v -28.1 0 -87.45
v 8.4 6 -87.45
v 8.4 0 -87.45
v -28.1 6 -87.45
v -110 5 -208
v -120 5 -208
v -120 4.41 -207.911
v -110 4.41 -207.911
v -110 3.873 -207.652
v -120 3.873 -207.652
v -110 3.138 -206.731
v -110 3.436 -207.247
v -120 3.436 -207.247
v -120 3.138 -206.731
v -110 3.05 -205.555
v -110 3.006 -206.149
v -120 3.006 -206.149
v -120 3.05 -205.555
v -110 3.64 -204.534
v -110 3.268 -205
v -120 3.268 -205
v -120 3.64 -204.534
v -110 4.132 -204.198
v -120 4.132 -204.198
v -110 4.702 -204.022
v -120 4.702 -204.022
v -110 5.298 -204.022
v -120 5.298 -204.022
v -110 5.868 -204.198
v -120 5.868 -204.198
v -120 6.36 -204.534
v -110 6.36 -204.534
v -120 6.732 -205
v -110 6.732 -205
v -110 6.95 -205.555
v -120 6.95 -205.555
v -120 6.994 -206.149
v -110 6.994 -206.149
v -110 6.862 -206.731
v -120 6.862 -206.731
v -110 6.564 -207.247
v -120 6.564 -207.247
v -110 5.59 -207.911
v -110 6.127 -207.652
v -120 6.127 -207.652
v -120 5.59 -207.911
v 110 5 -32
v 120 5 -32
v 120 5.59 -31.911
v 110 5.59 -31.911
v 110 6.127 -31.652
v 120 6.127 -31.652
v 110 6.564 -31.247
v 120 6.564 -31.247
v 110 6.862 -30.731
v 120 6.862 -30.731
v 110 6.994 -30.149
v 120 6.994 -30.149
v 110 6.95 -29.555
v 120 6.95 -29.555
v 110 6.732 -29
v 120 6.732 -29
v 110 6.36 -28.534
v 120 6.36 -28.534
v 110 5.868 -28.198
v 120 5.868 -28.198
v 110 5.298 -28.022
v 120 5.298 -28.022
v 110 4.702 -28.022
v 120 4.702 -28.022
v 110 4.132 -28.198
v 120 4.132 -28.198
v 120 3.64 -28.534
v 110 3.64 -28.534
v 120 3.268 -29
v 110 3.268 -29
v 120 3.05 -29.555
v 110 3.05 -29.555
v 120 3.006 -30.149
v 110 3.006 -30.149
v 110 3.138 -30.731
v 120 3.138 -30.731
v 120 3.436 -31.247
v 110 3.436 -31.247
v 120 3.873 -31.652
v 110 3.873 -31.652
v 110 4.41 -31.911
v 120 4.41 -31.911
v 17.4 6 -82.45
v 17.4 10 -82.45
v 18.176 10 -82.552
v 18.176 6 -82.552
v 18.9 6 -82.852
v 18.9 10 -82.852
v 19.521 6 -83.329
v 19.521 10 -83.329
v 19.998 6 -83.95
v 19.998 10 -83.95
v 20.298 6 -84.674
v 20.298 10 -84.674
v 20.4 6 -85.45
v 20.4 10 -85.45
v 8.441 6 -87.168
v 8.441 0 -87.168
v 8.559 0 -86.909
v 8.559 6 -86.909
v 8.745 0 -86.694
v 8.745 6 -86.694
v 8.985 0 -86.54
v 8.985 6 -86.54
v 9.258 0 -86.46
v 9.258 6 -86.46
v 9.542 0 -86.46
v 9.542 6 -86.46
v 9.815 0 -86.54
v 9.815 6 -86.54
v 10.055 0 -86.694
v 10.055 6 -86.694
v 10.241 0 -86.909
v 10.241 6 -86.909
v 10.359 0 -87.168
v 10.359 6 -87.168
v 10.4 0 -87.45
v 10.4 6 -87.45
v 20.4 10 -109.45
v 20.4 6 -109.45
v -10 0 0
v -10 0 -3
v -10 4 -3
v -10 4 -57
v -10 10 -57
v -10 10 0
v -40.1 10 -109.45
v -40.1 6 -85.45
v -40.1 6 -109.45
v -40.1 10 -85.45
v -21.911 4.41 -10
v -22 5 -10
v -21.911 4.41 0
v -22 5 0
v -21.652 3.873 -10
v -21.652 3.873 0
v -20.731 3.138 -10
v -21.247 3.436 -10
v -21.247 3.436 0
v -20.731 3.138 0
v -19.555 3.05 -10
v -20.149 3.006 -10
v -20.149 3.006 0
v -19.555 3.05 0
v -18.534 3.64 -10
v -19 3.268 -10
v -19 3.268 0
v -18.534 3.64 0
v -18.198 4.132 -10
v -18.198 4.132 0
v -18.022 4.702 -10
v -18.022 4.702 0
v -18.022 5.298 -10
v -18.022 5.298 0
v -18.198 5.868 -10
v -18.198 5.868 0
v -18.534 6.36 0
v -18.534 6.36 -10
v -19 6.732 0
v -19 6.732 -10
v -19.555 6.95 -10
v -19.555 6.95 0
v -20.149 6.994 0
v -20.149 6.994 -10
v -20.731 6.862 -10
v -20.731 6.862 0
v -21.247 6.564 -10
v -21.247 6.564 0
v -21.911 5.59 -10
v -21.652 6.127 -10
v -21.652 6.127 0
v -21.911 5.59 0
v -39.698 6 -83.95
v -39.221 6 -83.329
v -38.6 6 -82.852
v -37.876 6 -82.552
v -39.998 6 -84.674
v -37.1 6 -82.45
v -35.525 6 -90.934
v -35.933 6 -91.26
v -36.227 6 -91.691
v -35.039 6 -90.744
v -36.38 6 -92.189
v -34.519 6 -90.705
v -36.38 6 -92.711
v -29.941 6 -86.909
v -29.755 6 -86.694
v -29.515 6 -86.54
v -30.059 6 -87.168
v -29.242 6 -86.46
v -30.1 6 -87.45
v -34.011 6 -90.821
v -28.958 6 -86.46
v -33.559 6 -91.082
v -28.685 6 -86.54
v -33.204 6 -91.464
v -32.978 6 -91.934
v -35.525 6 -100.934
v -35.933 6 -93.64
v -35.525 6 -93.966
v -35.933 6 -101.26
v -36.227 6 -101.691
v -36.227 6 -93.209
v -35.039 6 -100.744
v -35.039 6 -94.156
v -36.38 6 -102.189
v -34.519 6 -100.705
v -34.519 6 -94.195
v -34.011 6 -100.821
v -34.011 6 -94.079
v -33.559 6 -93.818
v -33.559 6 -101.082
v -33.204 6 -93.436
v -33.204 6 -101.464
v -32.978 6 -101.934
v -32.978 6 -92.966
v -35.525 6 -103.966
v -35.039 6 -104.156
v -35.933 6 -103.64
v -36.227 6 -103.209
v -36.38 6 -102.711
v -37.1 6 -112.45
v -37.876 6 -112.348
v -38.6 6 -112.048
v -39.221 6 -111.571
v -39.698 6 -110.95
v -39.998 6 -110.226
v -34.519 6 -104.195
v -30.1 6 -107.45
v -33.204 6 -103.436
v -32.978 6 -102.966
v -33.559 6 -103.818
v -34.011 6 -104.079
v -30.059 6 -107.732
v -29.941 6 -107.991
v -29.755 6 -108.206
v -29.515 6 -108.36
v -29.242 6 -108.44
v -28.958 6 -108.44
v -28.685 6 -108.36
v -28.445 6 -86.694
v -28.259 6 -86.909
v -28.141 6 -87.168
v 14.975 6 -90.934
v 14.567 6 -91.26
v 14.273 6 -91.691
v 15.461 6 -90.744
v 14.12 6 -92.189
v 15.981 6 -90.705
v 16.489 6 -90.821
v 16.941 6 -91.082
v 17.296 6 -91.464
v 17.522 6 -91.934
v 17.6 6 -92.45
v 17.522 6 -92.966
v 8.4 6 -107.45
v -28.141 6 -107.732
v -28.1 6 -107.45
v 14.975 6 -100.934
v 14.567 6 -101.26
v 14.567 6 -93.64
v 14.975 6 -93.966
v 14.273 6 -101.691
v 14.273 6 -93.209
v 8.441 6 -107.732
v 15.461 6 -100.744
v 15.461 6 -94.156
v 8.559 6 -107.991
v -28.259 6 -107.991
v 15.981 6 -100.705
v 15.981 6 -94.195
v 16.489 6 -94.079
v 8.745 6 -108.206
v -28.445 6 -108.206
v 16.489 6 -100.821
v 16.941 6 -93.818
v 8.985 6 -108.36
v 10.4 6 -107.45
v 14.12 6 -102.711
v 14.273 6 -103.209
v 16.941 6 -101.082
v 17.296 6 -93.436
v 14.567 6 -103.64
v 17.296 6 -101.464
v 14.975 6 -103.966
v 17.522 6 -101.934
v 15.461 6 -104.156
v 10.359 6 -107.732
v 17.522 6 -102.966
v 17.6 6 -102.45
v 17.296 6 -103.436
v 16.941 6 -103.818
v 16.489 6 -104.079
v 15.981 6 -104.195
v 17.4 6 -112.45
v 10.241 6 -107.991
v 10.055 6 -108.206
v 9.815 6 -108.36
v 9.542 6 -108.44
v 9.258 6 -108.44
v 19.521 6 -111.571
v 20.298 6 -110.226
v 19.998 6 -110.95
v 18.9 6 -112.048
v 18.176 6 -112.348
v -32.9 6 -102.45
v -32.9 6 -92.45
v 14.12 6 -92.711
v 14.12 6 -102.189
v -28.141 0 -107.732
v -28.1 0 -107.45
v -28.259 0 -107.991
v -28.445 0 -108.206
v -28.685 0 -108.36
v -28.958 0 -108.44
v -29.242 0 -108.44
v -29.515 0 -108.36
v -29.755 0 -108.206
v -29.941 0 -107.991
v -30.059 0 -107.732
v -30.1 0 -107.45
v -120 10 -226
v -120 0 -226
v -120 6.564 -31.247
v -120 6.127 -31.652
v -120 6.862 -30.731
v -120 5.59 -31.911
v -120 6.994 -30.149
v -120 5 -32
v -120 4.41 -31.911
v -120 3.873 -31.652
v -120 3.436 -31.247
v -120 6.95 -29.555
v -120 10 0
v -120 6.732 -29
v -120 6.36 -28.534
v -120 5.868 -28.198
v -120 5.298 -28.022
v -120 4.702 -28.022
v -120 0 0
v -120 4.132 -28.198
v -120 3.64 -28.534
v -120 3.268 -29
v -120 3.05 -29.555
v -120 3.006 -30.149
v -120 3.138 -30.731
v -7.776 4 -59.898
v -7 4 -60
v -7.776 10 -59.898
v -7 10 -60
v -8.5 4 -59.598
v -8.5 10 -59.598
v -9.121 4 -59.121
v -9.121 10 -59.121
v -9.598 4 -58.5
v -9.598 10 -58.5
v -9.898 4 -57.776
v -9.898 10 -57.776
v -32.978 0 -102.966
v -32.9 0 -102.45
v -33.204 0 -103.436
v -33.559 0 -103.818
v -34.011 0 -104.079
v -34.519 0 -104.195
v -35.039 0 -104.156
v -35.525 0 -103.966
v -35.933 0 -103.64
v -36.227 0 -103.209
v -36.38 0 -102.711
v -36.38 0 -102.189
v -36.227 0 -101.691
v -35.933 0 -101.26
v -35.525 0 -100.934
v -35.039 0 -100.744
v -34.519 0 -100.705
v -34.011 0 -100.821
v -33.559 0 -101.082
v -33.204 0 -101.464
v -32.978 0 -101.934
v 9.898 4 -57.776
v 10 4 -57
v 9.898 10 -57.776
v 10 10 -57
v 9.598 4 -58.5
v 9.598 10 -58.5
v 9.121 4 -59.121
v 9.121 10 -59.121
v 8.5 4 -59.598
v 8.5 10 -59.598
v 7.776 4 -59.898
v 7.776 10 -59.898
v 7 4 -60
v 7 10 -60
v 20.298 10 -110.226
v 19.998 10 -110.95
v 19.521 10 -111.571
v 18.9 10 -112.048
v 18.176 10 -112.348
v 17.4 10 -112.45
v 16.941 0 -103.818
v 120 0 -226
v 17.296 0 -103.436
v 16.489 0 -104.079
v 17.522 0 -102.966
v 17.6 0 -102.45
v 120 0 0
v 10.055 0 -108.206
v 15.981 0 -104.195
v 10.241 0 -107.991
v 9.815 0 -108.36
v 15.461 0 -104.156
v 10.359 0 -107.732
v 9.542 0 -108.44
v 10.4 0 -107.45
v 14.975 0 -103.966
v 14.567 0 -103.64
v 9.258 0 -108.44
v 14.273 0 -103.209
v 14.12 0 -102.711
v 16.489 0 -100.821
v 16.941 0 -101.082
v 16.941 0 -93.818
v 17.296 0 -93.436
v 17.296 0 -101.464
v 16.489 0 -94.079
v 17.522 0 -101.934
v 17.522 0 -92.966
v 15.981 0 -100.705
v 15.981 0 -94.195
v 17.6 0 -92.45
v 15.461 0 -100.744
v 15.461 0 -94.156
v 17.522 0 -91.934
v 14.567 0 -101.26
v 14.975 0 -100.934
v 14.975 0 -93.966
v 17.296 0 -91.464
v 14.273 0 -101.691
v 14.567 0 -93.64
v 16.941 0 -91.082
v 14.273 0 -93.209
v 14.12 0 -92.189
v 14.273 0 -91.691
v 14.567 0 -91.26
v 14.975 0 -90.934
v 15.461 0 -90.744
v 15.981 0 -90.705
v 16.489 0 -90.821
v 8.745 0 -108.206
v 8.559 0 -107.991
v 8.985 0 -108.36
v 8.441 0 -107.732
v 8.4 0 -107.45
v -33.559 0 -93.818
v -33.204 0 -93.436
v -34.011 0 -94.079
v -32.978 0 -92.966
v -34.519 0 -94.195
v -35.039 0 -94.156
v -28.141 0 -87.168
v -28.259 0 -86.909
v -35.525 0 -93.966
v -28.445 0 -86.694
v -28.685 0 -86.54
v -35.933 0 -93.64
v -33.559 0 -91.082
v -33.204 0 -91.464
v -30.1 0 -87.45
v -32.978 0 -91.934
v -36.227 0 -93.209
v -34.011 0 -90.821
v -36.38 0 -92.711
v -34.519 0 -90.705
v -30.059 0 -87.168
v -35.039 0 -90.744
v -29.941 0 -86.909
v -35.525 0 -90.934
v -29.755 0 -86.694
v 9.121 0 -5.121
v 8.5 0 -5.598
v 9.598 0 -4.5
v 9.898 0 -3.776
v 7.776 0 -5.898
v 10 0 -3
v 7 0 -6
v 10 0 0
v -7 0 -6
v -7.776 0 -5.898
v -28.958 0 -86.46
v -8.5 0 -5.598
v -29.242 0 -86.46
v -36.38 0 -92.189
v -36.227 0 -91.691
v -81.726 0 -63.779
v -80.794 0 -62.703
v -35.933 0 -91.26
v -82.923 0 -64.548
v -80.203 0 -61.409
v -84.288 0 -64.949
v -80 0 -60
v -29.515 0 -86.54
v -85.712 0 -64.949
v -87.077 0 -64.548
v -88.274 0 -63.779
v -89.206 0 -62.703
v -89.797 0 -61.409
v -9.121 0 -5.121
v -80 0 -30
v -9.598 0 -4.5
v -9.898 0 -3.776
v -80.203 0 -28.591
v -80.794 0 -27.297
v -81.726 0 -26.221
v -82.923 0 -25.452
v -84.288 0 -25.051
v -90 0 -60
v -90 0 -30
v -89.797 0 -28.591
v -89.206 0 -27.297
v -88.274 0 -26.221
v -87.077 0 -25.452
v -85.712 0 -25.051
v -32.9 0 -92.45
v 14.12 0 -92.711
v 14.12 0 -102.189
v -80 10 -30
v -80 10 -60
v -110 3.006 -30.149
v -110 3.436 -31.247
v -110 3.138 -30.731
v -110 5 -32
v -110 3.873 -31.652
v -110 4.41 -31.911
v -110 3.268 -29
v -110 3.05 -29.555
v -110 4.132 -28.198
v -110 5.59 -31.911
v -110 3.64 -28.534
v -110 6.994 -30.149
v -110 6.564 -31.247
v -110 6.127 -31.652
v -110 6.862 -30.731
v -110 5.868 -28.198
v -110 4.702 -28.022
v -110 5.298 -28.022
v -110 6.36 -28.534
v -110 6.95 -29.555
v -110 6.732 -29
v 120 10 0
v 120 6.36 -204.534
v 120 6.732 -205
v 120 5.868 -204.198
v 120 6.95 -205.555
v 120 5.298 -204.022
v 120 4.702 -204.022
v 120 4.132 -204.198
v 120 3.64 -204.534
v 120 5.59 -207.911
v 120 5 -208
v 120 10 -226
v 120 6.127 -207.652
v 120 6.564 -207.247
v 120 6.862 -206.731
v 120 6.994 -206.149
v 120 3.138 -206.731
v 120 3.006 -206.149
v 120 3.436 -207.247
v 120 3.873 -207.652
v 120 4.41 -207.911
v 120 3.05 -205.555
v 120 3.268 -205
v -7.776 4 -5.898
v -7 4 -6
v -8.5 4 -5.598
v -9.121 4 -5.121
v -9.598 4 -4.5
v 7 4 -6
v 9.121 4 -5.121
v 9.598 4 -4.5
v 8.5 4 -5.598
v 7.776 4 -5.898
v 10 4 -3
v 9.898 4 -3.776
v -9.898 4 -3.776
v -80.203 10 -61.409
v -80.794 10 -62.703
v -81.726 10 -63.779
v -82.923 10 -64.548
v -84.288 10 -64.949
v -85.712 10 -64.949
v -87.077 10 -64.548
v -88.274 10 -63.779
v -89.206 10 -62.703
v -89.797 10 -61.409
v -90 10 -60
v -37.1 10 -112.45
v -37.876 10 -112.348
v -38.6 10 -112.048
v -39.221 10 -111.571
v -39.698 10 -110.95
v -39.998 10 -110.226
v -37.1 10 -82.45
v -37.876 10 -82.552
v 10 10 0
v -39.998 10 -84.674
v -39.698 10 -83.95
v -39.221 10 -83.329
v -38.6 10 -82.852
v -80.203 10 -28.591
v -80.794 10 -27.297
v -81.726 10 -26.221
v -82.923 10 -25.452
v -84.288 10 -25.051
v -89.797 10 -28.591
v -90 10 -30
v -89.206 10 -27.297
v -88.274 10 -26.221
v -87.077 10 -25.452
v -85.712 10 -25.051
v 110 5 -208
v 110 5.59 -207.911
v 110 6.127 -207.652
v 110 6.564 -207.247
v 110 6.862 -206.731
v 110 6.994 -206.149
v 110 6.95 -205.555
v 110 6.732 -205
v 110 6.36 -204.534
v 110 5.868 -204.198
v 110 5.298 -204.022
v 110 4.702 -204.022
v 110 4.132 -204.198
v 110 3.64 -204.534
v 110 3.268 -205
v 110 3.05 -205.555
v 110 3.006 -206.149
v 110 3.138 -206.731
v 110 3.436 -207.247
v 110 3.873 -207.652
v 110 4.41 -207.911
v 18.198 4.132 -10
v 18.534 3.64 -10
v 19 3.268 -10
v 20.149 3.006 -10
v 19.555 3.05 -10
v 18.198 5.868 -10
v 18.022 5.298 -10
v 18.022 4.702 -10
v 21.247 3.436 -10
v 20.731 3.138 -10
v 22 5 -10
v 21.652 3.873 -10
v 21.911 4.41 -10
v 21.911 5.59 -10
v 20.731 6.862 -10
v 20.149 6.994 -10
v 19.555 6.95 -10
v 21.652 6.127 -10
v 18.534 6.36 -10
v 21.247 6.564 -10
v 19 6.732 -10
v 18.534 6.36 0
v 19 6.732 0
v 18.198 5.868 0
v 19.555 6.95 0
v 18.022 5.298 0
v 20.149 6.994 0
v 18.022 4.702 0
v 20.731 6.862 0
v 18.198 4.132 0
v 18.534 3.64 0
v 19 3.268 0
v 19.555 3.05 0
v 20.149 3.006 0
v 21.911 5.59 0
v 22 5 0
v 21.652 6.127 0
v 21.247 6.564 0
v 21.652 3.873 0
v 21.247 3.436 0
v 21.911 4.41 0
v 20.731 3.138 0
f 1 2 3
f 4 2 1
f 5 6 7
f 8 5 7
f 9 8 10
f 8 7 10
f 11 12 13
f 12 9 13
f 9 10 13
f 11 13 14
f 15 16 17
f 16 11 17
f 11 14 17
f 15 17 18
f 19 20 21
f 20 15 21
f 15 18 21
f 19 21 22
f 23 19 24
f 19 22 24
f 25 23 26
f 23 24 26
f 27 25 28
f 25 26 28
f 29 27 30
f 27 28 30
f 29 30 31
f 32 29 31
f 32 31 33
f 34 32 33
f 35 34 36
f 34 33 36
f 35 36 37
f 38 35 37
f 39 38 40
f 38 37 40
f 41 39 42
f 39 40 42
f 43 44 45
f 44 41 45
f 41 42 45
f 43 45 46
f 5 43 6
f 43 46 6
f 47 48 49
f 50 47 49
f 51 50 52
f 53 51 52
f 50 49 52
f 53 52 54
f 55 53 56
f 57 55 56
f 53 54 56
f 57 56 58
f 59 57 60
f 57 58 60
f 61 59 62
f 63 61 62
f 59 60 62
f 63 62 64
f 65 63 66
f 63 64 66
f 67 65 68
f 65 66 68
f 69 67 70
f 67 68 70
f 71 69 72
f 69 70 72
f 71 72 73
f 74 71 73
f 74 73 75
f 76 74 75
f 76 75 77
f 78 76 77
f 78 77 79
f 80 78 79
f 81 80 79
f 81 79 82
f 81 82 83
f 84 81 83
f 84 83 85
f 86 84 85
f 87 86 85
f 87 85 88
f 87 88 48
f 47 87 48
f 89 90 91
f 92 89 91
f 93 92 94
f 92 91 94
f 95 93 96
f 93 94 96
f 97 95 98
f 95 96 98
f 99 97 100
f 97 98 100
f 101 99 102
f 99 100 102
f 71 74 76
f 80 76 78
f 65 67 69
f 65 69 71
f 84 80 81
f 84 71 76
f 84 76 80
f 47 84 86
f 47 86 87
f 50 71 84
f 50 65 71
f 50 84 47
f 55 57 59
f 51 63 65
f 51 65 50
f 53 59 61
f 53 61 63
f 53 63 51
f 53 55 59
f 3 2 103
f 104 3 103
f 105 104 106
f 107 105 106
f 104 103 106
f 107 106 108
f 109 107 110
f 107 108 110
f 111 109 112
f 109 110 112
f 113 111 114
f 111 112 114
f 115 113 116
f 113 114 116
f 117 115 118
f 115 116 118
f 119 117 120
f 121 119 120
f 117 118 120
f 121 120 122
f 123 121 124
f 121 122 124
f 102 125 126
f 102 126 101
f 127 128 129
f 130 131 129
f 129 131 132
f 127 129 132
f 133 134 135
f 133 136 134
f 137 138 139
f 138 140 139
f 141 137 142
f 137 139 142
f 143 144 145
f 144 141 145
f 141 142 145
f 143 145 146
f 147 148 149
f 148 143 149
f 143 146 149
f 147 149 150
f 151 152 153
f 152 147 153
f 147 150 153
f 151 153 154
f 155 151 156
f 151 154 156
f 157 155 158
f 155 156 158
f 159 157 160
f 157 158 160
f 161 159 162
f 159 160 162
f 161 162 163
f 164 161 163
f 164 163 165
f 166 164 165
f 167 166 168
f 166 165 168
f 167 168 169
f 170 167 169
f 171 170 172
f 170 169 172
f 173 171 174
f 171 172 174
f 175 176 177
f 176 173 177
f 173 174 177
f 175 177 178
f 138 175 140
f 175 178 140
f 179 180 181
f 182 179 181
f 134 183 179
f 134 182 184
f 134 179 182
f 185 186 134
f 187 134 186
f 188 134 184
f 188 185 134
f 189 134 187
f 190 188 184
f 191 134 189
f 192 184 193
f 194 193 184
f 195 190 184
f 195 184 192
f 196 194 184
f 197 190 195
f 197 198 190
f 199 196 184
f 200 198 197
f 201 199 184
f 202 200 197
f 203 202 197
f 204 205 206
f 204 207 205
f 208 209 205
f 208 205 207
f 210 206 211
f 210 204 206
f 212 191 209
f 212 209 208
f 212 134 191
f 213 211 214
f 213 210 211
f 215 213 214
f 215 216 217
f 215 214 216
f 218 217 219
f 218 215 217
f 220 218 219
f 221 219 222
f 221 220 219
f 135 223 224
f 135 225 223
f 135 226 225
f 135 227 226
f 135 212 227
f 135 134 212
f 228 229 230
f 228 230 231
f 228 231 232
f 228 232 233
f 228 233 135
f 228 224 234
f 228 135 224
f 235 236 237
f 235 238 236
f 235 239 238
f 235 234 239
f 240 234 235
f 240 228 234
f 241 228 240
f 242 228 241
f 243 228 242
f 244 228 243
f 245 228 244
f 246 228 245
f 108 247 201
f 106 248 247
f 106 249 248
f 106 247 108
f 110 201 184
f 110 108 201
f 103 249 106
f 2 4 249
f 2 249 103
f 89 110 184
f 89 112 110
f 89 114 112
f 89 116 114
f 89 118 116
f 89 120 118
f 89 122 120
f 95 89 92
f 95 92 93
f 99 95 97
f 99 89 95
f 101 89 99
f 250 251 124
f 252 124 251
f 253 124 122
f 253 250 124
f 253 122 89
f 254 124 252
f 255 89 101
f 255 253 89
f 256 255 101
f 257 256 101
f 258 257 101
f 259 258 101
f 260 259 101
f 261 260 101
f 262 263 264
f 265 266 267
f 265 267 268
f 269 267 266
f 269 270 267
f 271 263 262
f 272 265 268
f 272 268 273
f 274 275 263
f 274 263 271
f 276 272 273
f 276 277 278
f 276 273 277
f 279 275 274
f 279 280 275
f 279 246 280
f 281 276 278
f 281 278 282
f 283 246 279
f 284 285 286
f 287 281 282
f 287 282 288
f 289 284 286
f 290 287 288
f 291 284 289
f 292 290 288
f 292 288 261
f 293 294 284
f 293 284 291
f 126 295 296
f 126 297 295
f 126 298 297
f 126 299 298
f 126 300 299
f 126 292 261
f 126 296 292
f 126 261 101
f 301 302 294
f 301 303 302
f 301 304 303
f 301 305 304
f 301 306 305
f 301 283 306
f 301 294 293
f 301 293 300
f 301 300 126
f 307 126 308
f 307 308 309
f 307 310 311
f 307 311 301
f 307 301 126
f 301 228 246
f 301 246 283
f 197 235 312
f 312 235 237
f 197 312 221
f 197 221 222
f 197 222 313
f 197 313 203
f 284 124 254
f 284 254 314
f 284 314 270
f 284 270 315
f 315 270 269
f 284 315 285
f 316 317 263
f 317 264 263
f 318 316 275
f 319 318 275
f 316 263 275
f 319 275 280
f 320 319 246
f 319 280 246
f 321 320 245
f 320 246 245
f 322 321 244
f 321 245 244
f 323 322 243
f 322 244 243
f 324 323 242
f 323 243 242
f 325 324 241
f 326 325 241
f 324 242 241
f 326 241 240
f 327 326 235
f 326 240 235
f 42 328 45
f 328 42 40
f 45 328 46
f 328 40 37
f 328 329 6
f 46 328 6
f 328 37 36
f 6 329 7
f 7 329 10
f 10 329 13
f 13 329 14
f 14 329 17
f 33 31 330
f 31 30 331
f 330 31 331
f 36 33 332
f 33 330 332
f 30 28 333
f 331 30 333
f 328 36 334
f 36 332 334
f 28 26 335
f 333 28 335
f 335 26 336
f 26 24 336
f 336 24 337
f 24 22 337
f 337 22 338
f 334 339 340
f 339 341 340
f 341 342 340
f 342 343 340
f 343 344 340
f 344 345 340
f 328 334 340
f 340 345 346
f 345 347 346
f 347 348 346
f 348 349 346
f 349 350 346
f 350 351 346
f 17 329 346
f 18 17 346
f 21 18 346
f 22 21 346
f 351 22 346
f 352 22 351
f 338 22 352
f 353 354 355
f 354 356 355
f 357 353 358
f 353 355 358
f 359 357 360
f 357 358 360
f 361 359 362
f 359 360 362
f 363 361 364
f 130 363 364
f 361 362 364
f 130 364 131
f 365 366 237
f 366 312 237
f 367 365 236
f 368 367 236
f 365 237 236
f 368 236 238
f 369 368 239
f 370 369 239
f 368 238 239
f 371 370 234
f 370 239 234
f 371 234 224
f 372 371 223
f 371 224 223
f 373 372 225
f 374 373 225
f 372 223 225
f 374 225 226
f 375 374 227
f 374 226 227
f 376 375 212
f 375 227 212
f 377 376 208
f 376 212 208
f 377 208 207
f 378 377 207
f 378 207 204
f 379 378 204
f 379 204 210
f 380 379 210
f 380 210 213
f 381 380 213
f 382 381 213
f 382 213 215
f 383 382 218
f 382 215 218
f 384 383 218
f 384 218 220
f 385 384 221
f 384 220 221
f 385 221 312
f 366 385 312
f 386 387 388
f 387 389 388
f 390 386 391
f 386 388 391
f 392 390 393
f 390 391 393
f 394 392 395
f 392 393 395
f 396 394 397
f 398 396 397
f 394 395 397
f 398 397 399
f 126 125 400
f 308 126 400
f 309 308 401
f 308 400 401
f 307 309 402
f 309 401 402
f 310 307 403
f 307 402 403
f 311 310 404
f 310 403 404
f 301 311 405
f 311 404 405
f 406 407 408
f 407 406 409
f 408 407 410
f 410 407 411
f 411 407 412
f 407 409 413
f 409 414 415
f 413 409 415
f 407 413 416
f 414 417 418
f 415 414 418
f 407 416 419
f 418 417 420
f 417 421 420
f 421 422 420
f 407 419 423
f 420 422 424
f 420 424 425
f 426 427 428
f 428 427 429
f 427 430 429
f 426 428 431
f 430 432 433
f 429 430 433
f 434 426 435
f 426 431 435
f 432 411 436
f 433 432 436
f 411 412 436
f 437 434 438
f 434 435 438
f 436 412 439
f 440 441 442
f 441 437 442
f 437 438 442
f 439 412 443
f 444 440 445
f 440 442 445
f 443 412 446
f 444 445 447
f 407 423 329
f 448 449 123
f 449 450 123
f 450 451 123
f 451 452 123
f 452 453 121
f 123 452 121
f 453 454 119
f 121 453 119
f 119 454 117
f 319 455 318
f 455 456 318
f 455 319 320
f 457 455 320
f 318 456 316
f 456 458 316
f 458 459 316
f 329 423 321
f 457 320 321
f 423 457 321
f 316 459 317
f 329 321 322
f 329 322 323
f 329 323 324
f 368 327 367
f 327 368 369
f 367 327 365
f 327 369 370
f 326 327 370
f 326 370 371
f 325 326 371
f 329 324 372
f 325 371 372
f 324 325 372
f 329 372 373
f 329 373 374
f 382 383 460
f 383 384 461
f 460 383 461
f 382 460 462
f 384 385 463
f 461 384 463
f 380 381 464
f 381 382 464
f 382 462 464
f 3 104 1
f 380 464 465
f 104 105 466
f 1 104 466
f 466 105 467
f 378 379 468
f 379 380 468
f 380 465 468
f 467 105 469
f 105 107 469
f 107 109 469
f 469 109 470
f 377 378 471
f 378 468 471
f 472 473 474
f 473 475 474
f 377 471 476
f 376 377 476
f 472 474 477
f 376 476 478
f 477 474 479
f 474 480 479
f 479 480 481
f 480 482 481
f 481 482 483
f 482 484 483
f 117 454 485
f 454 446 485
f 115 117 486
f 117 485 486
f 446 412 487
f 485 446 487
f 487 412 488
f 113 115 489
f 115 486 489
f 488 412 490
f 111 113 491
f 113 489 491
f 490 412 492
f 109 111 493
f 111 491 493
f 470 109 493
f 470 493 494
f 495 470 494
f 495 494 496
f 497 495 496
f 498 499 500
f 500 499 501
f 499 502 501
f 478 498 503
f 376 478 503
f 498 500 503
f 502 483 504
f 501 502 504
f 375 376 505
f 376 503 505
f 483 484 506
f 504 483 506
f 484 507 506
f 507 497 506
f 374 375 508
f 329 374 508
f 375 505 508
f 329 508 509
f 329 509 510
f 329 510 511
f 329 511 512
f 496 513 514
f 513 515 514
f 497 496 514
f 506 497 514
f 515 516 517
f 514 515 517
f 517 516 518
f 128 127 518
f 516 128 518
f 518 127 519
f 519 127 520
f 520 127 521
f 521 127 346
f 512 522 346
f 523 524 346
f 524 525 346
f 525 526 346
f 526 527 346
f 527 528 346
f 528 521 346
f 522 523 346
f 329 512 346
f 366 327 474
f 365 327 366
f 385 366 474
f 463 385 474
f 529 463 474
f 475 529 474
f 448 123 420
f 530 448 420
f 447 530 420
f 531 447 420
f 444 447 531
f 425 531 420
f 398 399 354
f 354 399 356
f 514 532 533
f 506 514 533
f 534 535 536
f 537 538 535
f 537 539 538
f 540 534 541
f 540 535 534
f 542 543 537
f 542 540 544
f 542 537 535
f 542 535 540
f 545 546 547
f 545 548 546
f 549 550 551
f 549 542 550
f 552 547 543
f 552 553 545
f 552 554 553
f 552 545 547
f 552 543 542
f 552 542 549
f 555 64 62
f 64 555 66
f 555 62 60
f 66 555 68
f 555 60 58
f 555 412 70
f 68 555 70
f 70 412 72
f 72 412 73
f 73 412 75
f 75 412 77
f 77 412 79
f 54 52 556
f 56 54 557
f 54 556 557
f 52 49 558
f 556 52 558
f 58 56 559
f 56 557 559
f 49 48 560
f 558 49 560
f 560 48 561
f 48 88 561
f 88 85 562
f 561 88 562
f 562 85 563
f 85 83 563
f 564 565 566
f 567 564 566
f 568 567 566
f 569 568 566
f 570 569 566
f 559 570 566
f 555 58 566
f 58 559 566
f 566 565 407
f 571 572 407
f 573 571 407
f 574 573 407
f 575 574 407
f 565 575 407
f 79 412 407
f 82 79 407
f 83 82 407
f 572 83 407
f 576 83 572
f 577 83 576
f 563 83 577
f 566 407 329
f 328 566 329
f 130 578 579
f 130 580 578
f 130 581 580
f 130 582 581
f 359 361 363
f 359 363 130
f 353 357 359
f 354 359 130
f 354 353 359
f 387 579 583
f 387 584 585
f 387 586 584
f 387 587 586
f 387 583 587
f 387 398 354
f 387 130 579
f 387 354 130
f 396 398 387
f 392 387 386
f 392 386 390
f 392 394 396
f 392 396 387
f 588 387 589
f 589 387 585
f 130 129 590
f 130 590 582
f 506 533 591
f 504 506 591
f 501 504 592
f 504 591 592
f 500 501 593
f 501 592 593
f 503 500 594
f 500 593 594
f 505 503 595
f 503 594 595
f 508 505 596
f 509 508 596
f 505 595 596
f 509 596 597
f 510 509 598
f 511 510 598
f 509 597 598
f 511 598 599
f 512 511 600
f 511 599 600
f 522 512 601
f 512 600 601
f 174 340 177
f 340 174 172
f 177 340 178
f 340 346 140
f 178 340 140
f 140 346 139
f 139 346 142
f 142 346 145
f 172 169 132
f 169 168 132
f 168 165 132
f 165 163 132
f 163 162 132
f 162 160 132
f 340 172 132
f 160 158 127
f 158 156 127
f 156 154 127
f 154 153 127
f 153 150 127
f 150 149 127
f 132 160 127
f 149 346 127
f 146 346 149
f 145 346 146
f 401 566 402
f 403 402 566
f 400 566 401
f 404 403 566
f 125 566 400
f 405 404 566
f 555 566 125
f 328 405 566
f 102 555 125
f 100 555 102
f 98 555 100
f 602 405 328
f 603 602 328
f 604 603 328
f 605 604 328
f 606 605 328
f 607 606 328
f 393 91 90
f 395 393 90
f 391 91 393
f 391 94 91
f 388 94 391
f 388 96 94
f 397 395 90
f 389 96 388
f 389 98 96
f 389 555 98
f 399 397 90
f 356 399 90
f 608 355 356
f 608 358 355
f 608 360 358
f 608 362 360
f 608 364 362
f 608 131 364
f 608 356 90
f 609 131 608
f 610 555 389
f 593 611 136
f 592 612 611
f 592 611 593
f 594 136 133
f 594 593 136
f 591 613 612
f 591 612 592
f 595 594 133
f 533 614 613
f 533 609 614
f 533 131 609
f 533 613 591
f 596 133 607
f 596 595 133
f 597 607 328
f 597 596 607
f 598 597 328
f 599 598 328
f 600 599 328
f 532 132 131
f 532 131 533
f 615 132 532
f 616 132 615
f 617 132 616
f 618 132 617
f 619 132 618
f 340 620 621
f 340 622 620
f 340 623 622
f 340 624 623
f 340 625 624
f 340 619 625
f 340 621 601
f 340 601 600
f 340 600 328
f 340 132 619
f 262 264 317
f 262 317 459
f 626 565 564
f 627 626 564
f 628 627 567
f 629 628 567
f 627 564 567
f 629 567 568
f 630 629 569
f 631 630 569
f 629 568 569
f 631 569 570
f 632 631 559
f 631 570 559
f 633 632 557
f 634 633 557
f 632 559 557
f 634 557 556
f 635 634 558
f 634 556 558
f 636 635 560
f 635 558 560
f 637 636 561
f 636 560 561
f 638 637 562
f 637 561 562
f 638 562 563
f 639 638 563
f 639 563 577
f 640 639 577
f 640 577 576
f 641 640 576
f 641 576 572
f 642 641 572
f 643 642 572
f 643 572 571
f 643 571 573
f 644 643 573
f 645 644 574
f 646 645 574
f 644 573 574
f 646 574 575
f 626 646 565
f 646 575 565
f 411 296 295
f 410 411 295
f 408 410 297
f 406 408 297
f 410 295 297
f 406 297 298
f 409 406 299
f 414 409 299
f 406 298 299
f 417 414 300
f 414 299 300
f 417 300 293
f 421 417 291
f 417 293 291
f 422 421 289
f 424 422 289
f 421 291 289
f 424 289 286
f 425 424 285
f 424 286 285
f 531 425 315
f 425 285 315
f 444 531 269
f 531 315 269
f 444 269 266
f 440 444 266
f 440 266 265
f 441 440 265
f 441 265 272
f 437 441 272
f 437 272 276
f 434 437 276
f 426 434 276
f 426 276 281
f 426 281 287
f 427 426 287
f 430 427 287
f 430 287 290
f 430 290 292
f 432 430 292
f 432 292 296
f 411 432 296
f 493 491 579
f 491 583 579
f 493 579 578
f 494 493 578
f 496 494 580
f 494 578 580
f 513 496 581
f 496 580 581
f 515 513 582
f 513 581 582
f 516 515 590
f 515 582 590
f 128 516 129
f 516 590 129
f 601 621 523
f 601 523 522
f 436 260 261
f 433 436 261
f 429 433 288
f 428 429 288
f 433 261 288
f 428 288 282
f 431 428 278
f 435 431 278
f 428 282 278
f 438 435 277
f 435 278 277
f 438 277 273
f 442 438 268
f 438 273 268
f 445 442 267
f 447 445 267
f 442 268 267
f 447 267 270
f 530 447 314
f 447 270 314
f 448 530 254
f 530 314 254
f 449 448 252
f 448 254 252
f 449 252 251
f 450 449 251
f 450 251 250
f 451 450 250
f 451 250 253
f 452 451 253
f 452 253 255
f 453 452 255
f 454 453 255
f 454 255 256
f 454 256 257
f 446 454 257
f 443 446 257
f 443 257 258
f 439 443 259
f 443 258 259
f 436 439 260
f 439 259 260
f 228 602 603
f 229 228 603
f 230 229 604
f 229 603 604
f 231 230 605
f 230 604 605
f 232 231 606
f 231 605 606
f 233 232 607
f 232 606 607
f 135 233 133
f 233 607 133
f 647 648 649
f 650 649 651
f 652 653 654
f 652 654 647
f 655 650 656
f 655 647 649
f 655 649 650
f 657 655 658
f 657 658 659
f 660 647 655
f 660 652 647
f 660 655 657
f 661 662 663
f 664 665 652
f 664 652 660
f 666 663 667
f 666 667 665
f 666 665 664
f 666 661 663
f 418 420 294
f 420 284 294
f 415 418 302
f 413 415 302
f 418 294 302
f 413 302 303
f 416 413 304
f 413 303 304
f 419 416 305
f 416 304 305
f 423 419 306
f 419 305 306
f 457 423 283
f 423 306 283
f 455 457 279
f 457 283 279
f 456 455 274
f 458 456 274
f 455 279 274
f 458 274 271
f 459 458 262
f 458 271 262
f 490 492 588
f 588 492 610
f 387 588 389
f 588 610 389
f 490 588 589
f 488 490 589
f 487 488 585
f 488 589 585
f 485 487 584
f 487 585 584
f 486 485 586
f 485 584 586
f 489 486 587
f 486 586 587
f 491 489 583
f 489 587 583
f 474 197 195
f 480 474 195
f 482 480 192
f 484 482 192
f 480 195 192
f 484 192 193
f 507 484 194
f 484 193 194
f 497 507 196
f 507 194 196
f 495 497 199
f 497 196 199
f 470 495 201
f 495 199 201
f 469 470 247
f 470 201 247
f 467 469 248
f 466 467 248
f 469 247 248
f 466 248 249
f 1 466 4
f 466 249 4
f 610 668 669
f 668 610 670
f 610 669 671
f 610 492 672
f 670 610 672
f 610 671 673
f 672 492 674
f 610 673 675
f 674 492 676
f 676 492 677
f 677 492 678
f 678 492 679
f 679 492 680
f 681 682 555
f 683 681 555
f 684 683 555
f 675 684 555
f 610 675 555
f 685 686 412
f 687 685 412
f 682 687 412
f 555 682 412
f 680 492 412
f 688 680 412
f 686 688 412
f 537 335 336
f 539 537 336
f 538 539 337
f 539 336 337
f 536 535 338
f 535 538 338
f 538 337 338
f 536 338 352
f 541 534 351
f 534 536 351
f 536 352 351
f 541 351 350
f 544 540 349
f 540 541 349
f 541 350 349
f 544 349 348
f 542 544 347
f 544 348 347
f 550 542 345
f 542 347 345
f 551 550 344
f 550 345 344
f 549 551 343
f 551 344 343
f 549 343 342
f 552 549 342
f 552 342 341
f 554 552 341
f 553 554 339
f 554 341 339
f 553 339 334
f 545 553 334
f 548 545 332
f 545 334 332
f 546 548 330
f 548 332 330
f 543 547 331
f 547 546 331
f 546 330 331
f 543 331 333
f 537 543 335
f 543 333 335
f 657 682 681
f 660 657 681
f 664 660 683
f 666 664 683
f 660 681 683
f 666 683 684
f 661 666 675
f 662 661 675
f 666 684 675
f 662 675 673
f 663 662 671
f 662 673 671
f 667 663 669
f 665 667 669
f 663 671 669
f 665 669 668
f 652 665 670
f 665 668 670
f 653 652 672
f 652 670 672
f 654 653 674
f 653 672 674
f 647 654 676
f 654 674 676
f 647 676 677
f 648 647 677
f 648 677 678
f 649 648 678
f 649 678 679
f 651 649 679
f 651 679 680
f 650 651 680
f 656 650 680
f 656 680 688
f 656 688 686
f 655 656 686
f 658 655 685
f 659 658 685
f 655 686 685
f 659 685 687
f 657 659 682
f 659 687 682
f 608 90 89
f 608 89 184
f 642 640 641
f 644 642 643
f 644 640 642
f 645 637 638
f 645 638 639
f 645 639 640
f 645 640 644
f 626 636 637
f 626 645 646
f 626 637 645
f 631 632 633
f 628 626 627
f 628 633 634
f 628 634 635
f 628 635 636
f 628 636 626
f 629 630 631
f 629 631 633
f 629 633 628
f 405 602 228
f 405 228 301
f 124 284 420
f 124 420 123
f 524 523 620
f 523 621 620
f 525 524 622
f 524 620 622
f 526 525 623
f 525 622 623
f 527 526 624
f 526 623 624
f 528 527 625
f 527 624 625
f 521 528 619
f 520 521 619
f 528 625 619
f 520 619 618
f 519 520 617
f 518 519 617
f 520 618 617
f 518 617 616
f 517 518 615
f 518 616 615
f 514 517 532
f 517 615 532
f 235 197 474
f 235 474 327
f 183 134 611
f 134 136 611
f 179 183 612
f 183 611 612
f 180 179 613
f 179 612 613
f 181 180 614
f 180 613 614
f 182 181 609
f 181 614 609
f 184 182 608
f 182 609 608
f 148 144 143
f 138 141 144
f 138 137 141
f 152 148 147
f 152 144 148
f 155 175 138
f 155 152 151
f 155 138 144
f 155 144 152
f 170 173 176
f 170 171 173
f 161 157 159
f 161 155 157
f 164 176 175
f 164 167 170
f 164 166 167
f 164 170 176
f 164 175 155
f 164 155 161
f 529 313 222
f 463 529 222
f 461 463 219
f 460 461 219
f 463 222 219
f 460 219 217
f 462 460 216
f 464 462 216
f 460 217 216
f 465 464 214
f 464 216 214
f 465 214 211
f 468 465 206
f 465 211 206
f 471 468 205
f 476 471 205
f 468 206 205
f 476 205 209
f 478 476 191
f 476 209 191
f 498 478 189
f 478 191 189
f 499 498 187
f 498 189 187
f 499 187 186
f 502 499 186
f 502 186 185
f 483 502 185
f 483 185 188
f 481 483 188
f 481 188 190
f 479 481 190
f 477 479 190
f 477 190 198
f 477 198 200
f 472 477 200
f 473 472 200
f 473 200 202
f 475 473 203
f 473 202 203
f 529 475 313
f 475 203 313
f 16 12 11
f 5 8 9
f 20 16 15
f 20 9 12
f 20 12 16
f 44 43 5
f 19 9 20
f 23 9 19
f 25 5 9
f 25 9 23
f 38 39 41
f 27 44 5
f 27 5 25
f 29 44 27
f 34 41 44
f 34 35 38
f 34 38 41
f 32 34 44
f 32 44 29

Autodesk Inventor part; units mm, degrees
ref_plane "YZ Plane" through (0, 0, 0) normal (1, 0, 0) x (0, 1, 0)
ref_plane "XZ Plane" through (0, 0, 0) normal (0, 1, 0) x (-1, 0, 0)
ref_plane "XY Plane" through (0, 0, 0) normal (0, 0, 1) x (1, 0, 0)
sketch "Sketch1" plane through (0, 0, 0) normal (0, 1, 0) x (-1, 0, 0)
  line L0 (0, 0) -> (-120, 0)
  line L1 (-120, 0) -> (-120, -226)
  line L2 (-120, -226) -> (0, -226)
  line L3 (0, -226) -> (0, 0)
  dimension "d0" = 120
  dimension "d1" = 226
extrude "Extrusion1" add sketch "Sketch1" along normal blind 10
sketch "Sketch2" plane through (120, 0, 0) normal (1, 0, 0) x (0, 0, -1)
  circle A0 centre (30, 5) radius 2
  line L0 (0, 0) -> (0, 10) projected
  line L1 (0, 10) -> (226, 10) projected
  circle A1 centre (206, 5) radius 2
  dimension "d4" = 4
  dimension "d5" = 30
  dimension "d6" = 5
  dimension "d9" = 176
extrude "Extrusion2" cut sketch "Sketch2" against normal blind 10
sketch "Sketch3" plane through (0, 0, 0) normal (0, 0, 1) x (1, 0, 0)
  circle A0 centre (20, 5) radius 2
  line L0 (0, 10) -> (120, 10) projected
  line L1 (0, 0) -> (0, 10) projected
  dimension "d16" = 4
  dimension "d17" = 5
  dimension "d18" = 20
extrude "Extrusion3" cut sketch "Sketch3" against normal blind 10
mirror "Mirror1" about plane through (0, 0, -226) normal (-1, 0, 0)
sketch "Sketch4" plane through (0, 10, 0) normal (0, 1, 0) x (1, 0, 0)
  circle A0 centre (0, 97.45) radius 10
  line L0 (120, 0) -> (-120, 0) projected
  line L1 (-30.1, 107.45) -> (10.4, 107.45)
  line L2 (10.4, 107.45) -> (10.4, 87.45)
  line L3 (10.4, 87.45) -> (-30.1, 87.45)
  line L4 (-30.1, 87.45) -> (-30.1, 107.45)
  circle A1 centre (-34.65, 92.45) radius 1.75
  circle A2 centre (-34.65, 102.45) radius 1.75
  circle A3 centre (15.85, 92.45) radius 1.75
  circle A4 centre (15.85, 102.45) radius 1.75
  arc A5 (10.4, 107.45) -> (8.4, 107.45) centre (9.4, 107.45) ccw
  arc A6 (8.4, 87.45) -> (10.4, 87.45) centre (9.4, 87.45) ccw
  arc A7 (-28.1, 107.45) -> (-30.1, 107.45) centre (-29.1, 107.45) ccw
  arc A8 (-30.1, 87.45) -> (-28.1, 87.45) centre (-29.1, 87.45) ccw
  arc A9 (-90, 30) -> (-80, 30) centre (-85, 30) ccw
  arc A10 (-80, 60) -> (-90, 60) centre (-85, 60) ccw
  line L5 (-90, 30) -> (-90, 60)
  line L6 (-80, 30) -> (-80, 60)
  line L7 (-120, 0) -> (-120, 226) projected
  point P0 (0, 0)
  dimension "d21" = 97.45
  dimension "d22" = 0
  dimension "d23" = 20
  dimension "d24" = 20
  dimension "d27" = 10.4
  dimension "d28" = 3.5
  dimension "d31" = 10
  dimension "d34" = 50.5
  dimension "d37" = 5
  dimension "d38" = 4.55
  dimension "d39" = 30.1
  dimension "d50" = 1
  dimension "d54" = 10
  dimension "d55" = 30
  dimension "d56" = 30
  dimension "d57" = 30
extrude "Extrusion4" cut sketch "Sketch4" against normal through all
sketch "Sketch5" plane through (0, 10, 0) normal (0, 1, 0) x (1, 0, 0)
  line L0 (-37.1, 112.45) -> (17.4, 112.45)
  line L1 (20.4, 109.45) -> (20.4, 85.45)
  line L2 (17.4, 82.45) -> (-37.1, 82.45)
  line L3 (-40.1, 85.45) -> (-40.1, 109.45)
  line L4 (10.4, 107.45) -> (10.4, 87.45) projected
  line L5 (-28.1, 107.45) -> (8.4, 107.45) projected
  arc A0 (-40.1, 85.45) -> (-37.1, 82.45) centre (-37.1, 85.45) ccw
  arc A1 (-37.1, 112.45) -> (-40.1, 109.45) centre (-37.1, 109.45) ccw
  arc A2 (20.4, 109.45) -> (17.4, 112.45) centre (17.4, 109.45) ccw
  arc A3 (17.4, 82.45) -> (20.4, 85.45) centre (17.4, 85.45) ccw
  point P0 (0, 0)
  point P1 (-40.1, 112.45)
  point P2 (20.4, 82.45)
  point P3 (20.4, 112.45)
  point P4 (-40.1, 82.45)
  point P5 (-30.1, 107.45)
  dimension "d42" = 10
  dimension "d43" = 30
  dimension "d44" = 60.5
  dimension "d45" = 5
  dimension "d48" = 3
extrude "Extrusion5" cut sketch "Sketch5" against normal blind 4
sketch "Sketch6" plane through (0, 10, 0) normal (0, 1, 0) x (1, 0, 0)
  line L0 (-10, 0) -> (10, 0)
  line L1 (10, 0) -> (10, 57)
  line L2 (7, 60) -> (-7, 60)
  line L3 (-10, 57) -> (-10, 0)
  line L4 (120, 0) -> (-120, 0) projected
  arc A0 (-7, 60) -> (-10, 57) centre (-7, 57) ccw
  arc A1 (10, 57) -> (7, 60) centre (7, 57) ccw
  point P0 (0, 0)
  point P1 (10, 60)
  point P2 (-10, 60)
  dimension "d58" = 20
  dimension "d59" = 60
  dimension "d60" = 10
  dimension "d61" = 0
  dimension "d64" = 3
extrude "Extrusion6" cut sketch "Sketch6" against normal blind 6
sketch "Sketch7" plane through (0, 4, 0) normal (0, 1, 0) x (1, 0, 0)
  line L0 (-10, 0) -> (-10, 57) projected
  line L1 (-10, 0) -> (10, 0)
  line L2 (10, 0) -> (10, 3)
  line L3 (7, 6) -> (-7, 6)
  line L4 (-10, 3) -> (-10, 0)
  arc A0 (-7, 6) -> (-10, 3) centre (-7, 3) ccw
  arc A1 (10, 3) -> (7, 6) centre (7, 3) ccw
  point P0 (0, 0)
  point P1 (10, 6)
  point P2 (-10, 6)
  dimension "d66" = 20
  dimension "d67" = 6
  dimension "d70" = 3
extrude "Extrusion7" cut sketch "Sketch7" against normal through all
equation "\"d4\" = screws"
equation "\"d16\" = screws"
equation "\"screws\" = 4"
properties part number "box_shelf"
